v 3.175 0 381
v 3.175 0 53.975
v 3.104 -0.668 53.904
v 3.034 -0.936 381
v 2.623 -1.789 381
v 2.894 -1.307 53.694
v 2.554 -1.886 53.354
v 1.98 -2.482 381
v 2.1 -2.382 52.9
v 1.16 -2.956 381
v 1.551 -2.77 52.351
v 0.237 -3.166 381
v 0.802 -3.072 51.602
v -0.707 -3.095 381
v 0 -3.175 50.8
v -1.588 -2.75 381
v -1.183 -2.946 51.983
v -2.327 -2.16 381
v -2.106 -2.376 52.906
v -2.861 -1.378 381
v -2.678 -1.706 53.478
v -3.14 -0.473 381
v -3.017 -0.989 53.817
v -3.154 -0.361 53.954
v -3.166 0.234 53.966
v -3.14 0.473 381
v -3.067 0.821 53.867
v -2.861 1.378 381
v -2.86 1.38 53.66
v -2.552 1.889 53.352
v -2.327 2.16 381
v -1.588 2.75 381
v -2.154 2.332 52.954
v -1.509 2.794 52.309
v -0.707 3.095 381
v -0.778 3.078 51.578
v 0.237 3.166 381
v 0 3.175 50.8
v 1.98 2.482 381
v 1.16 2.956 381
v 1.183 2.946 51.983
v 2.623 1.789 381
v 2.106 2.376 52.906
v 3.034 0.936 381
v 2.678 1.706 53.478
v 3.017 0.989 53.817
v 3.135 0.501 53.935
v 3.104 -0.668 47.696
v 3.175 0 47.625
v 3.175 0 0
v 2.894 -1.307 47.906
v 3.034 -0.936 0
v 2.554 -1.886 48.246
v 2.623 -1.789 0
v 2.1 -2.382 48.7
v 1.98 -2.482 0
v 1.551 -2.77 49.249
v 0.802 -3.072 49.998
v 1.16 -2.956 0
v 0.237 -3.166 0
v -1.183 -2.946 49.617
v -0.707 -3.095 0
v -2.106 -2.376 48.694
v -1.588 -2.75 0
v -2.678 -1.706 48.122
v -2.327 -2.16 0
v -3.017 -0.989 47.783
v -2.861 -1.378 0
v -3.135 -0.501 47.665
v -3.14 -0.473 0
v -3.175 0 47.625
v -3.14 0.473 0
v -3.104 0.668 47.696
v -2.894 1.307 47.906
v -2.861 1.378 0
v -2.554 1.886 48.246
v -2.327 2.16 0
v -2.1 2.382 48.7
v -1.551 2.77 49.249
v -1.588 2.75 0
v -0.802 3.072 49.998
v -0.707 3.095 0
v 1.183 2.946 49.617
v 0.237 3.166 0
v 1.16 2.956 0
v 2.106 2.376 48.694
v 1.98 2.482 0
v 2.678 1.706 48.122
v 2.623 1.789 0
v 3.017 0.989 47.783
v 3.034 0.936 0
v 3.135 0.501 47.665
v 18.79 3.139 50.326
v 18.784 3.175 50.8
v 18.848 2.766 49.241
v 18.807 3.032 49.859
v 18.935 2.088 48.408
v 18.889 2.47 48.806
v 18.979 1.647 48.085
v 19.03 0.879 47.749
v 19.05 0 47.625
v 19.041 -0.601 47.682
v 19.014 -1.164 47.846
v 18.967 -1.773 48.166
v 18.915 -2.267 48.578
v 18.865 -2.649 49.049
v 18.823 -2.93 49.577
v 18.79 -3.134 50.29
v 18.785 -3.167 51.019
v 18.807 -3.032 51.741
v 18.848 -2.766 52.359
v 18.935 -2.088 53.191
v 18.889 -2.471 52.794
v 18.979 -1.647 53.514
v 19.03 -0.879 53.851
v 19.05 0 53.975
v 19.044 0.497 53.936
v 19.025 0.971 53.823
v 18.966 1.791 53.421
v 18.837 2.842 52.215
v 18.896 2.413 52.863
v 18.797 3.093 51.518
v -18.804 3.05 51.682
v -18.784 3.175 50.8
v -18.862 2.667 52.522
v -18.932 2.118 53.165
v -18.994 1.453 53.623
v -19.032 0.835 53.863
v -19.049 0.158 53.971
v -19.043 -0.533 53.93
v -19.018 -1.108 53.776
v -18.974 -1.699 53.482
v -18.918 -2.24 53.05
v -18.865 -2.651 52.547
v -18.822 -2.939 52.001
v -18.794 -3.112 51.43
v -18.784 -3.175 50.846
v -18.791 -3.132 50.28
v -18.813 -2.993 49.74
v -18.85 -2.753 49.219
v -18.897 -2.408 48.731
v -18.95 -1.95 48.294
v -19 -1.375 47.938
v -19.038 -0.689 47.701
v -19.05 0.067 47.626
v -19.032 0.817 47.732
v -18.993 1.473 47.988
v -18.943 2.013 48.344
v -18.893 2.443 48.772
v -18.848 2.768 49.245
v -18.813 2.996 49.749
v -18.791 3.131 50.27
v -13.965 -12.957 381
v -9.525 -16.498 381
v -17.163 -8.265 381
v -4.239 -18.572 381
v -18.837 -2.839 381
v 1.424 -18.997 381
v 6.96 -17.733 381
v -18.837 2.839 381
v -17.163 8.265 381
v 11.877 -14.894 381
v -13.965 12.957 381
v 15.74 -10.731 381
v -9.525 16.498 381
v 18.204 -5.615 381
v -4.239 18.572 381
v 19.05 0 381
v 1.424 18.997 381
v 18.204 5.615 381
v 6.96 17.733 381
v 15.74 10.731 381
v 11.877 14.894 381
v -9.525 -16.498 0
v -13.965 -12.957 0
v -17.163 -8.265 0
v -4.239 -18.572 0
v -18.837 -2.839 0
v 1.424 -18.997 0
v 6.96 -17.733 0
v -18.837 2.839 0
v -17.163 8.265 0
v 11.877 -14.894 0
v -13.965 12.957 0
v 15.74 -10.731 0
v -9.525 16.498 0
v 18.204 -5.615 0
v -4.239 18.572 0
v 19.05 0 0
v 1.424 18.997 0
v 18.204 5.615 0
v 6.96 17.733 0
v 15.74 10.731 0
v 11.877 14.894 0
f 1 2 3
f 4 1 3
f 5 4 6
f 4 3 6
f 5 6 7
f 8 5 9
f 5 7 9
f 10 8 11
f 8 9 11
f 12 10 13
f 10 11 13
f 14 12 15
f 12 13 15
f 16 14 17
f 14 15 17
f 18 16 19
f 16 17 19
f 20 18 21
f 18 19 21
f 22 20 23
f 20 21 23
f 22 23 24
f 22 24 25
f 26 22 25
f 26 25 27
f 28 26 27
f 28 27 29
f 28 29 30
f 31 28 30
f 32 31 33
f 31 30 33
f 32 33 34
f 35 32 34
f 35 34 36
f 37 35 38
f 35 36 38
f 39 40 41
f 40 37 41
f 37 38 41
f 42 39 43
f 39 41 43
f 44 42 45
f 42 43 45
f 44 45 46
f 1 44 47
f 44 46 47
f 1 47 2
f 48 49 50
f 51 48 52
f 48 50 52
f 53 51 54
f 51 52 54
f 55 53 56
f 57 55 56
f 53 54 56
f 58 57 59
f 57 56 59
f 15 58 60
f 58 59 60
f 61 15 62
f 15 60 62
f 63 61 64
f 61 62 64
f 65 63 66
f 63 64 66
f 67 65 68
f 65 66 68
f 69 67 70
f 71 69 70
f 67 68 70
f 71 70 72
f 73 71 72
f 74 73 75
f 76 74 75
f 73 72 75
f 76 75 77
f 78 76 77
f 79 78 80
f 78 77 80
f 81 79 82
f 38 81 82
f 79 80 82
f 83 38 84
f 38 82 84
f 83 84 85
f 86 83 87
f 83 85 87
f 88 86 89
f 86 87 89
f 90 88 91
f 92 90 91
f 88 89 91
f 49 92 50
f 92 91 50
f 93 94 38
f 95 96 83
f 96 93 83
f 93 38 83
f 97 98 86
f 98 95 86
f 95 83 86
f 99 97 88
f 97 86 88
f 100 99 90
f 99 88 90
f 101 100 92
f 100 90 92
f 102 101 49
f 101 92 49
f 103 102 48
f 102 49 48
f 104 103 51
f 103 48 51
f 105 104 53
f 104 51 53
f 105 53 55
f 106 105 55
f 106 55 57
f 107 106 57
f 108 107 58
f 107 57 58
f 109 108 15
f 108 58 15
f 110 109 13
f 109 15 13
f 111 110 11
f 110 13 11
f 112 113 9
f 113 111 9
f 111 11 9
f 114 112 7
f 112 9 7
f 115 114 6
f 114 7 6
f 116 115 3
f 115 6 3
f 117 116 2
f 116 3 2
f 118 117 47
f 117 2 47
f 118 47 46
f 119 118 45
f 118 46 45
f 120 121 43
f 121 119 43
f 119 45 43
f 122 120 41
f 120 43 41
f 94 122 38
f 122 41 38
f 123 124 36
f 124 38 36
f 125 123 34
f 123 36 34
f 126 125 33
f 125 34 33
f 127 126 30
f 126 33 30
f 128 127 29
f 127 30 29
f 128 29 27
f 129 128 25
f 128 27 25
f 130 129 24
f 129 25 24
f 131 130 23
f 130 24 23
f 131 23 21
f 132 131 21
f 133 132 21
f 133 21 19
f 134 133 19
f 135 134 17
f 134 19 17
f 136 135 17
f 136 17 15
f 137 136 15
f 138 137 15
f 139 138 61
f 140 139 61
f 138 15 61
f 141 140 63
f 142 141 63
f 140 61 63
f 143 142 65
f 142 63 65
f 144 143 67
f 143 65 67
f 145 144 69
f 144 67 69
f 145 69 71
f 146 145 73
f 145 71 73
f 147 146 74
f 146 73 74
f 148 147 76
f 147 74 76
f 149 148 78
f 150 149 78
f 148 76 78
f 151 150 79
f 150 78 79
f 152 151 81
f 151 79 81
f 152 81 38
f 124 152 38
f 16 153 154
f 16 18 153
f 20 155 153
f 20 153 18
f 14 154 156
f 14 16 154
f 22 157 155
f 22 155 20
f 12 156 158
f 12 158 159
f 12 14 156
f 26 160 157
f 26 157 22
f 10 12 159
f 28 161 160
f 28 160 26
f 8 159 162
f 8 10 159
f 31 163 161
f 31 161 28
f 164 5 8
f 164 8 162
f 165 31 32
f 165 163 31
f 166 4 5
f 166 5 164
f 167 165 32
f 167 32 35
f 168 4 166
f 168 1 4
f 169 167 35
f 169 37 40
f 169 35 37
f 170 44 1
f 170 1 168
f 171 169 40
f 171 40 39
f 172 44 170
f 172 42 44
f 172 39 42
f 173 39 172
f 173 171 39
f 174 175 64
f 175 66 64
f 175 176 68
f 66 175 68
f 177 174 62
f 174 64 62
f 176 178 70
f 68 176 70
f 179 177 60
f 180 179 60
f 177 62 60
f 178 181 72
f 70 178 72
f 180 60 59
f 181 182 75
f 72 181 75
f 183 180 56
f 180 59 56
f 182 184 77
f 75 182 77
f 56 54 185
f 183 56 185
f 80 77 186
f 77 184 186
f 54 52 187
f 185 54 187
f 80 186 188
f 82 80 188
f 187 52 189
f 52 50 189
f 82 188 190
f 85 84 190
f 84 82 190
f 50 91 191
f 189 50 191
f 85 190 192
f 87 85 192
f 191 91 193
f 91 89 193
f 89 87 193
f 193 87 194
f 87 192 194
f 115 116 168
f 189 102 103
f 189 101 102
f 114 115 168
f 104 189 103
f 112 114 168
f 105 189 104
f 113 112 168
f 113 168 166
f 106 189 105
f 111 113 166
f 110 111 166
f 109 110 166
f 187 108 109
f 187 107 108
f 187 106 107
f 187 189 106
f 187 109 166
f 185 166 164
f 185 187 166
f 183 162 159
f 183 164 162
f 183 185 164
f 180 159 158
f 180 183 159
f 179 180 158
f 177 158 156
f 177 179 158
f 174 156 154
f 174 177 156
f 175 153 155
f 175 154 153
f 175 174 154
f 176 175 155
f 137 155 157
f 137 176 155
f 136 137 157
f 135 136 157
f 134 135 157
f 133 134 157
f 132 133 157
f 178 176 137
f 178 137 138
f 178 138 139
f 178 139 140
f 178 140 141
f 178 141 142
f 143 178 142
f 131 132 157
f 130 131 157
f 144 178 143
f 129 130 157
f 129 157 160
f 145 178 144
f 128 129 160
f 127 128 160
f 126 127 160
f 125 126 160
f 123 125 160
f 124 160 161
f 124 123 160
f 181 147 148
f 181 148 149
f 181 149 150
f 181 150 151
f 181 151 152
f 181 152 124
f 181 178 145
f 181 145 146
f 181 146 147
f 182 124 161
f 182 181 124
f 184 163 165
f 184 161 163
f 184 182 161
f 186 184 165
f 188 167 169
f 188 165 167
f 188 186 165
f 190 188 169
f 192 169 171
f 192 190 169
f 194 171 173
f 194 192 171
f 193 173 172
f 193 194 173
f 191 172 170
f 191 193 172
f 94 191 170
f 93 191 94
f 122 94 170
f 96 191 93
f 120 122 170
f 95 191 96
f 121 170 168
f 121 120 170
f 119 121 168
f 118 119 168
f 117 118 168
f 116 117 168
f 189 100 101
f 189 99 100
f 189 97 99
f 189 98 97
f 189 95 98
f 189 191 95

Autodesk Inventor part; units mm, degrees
ref_plane "YZ Plane" through (0, 0, 0) normal (1, 0, 0) x (0, 1, 0)
ref_plane "XZ Plane" through (0, 0, 0) normal (0, 1, 0) x (-1, 0, 0)
ref_plane "XY Plane" through (0, 0, 0) normal (0, 0, 1) x (1, 0, 0)
sketch "Sketch6" plane through (0, 0, 0) normal (0, 0, 1) x (1, 0, 0)
  circle A0 centre (0, 0) radius 3.175
  circle A1 centre (0, 0) radius 19.05
  dimension "d17" = 6.35
  dimension "d18" = 38.1
extrude "Extrusion5" add sketch "Sketch6" along normal blind 381
sketch "Sketch7" plane through (0, 0, 0) normal (1, 0, 0) x (0, 1, 0)
  circle A0 centre (0, 50.8) radius 3.175
  line L0 (19.05, 0) -> (-19.05, 0) projected
  line L1 (19.05, 0) -> (19.05, 27.0227)
  line L2 (19.05, 0) -> (19.05, 381) projected
  line L3 (-19.05, 0.4439) -> (-19.05, 5.396)
  line L4 (-19.05, 0) -> (-19.05, 381) projected
  point P0 (0, 0)
  point P1 (0, 0)
  dimension "d21" = 6.35
  dimension "d22" = 19.05
  dimension "d23" = 19.05
  dimension "d24" = 50.8
extrude "Extrusion6" cut sketch "Sketch7" along normal mid plane 127
properties part number "Shaft connecting chass" material "CFRP"
